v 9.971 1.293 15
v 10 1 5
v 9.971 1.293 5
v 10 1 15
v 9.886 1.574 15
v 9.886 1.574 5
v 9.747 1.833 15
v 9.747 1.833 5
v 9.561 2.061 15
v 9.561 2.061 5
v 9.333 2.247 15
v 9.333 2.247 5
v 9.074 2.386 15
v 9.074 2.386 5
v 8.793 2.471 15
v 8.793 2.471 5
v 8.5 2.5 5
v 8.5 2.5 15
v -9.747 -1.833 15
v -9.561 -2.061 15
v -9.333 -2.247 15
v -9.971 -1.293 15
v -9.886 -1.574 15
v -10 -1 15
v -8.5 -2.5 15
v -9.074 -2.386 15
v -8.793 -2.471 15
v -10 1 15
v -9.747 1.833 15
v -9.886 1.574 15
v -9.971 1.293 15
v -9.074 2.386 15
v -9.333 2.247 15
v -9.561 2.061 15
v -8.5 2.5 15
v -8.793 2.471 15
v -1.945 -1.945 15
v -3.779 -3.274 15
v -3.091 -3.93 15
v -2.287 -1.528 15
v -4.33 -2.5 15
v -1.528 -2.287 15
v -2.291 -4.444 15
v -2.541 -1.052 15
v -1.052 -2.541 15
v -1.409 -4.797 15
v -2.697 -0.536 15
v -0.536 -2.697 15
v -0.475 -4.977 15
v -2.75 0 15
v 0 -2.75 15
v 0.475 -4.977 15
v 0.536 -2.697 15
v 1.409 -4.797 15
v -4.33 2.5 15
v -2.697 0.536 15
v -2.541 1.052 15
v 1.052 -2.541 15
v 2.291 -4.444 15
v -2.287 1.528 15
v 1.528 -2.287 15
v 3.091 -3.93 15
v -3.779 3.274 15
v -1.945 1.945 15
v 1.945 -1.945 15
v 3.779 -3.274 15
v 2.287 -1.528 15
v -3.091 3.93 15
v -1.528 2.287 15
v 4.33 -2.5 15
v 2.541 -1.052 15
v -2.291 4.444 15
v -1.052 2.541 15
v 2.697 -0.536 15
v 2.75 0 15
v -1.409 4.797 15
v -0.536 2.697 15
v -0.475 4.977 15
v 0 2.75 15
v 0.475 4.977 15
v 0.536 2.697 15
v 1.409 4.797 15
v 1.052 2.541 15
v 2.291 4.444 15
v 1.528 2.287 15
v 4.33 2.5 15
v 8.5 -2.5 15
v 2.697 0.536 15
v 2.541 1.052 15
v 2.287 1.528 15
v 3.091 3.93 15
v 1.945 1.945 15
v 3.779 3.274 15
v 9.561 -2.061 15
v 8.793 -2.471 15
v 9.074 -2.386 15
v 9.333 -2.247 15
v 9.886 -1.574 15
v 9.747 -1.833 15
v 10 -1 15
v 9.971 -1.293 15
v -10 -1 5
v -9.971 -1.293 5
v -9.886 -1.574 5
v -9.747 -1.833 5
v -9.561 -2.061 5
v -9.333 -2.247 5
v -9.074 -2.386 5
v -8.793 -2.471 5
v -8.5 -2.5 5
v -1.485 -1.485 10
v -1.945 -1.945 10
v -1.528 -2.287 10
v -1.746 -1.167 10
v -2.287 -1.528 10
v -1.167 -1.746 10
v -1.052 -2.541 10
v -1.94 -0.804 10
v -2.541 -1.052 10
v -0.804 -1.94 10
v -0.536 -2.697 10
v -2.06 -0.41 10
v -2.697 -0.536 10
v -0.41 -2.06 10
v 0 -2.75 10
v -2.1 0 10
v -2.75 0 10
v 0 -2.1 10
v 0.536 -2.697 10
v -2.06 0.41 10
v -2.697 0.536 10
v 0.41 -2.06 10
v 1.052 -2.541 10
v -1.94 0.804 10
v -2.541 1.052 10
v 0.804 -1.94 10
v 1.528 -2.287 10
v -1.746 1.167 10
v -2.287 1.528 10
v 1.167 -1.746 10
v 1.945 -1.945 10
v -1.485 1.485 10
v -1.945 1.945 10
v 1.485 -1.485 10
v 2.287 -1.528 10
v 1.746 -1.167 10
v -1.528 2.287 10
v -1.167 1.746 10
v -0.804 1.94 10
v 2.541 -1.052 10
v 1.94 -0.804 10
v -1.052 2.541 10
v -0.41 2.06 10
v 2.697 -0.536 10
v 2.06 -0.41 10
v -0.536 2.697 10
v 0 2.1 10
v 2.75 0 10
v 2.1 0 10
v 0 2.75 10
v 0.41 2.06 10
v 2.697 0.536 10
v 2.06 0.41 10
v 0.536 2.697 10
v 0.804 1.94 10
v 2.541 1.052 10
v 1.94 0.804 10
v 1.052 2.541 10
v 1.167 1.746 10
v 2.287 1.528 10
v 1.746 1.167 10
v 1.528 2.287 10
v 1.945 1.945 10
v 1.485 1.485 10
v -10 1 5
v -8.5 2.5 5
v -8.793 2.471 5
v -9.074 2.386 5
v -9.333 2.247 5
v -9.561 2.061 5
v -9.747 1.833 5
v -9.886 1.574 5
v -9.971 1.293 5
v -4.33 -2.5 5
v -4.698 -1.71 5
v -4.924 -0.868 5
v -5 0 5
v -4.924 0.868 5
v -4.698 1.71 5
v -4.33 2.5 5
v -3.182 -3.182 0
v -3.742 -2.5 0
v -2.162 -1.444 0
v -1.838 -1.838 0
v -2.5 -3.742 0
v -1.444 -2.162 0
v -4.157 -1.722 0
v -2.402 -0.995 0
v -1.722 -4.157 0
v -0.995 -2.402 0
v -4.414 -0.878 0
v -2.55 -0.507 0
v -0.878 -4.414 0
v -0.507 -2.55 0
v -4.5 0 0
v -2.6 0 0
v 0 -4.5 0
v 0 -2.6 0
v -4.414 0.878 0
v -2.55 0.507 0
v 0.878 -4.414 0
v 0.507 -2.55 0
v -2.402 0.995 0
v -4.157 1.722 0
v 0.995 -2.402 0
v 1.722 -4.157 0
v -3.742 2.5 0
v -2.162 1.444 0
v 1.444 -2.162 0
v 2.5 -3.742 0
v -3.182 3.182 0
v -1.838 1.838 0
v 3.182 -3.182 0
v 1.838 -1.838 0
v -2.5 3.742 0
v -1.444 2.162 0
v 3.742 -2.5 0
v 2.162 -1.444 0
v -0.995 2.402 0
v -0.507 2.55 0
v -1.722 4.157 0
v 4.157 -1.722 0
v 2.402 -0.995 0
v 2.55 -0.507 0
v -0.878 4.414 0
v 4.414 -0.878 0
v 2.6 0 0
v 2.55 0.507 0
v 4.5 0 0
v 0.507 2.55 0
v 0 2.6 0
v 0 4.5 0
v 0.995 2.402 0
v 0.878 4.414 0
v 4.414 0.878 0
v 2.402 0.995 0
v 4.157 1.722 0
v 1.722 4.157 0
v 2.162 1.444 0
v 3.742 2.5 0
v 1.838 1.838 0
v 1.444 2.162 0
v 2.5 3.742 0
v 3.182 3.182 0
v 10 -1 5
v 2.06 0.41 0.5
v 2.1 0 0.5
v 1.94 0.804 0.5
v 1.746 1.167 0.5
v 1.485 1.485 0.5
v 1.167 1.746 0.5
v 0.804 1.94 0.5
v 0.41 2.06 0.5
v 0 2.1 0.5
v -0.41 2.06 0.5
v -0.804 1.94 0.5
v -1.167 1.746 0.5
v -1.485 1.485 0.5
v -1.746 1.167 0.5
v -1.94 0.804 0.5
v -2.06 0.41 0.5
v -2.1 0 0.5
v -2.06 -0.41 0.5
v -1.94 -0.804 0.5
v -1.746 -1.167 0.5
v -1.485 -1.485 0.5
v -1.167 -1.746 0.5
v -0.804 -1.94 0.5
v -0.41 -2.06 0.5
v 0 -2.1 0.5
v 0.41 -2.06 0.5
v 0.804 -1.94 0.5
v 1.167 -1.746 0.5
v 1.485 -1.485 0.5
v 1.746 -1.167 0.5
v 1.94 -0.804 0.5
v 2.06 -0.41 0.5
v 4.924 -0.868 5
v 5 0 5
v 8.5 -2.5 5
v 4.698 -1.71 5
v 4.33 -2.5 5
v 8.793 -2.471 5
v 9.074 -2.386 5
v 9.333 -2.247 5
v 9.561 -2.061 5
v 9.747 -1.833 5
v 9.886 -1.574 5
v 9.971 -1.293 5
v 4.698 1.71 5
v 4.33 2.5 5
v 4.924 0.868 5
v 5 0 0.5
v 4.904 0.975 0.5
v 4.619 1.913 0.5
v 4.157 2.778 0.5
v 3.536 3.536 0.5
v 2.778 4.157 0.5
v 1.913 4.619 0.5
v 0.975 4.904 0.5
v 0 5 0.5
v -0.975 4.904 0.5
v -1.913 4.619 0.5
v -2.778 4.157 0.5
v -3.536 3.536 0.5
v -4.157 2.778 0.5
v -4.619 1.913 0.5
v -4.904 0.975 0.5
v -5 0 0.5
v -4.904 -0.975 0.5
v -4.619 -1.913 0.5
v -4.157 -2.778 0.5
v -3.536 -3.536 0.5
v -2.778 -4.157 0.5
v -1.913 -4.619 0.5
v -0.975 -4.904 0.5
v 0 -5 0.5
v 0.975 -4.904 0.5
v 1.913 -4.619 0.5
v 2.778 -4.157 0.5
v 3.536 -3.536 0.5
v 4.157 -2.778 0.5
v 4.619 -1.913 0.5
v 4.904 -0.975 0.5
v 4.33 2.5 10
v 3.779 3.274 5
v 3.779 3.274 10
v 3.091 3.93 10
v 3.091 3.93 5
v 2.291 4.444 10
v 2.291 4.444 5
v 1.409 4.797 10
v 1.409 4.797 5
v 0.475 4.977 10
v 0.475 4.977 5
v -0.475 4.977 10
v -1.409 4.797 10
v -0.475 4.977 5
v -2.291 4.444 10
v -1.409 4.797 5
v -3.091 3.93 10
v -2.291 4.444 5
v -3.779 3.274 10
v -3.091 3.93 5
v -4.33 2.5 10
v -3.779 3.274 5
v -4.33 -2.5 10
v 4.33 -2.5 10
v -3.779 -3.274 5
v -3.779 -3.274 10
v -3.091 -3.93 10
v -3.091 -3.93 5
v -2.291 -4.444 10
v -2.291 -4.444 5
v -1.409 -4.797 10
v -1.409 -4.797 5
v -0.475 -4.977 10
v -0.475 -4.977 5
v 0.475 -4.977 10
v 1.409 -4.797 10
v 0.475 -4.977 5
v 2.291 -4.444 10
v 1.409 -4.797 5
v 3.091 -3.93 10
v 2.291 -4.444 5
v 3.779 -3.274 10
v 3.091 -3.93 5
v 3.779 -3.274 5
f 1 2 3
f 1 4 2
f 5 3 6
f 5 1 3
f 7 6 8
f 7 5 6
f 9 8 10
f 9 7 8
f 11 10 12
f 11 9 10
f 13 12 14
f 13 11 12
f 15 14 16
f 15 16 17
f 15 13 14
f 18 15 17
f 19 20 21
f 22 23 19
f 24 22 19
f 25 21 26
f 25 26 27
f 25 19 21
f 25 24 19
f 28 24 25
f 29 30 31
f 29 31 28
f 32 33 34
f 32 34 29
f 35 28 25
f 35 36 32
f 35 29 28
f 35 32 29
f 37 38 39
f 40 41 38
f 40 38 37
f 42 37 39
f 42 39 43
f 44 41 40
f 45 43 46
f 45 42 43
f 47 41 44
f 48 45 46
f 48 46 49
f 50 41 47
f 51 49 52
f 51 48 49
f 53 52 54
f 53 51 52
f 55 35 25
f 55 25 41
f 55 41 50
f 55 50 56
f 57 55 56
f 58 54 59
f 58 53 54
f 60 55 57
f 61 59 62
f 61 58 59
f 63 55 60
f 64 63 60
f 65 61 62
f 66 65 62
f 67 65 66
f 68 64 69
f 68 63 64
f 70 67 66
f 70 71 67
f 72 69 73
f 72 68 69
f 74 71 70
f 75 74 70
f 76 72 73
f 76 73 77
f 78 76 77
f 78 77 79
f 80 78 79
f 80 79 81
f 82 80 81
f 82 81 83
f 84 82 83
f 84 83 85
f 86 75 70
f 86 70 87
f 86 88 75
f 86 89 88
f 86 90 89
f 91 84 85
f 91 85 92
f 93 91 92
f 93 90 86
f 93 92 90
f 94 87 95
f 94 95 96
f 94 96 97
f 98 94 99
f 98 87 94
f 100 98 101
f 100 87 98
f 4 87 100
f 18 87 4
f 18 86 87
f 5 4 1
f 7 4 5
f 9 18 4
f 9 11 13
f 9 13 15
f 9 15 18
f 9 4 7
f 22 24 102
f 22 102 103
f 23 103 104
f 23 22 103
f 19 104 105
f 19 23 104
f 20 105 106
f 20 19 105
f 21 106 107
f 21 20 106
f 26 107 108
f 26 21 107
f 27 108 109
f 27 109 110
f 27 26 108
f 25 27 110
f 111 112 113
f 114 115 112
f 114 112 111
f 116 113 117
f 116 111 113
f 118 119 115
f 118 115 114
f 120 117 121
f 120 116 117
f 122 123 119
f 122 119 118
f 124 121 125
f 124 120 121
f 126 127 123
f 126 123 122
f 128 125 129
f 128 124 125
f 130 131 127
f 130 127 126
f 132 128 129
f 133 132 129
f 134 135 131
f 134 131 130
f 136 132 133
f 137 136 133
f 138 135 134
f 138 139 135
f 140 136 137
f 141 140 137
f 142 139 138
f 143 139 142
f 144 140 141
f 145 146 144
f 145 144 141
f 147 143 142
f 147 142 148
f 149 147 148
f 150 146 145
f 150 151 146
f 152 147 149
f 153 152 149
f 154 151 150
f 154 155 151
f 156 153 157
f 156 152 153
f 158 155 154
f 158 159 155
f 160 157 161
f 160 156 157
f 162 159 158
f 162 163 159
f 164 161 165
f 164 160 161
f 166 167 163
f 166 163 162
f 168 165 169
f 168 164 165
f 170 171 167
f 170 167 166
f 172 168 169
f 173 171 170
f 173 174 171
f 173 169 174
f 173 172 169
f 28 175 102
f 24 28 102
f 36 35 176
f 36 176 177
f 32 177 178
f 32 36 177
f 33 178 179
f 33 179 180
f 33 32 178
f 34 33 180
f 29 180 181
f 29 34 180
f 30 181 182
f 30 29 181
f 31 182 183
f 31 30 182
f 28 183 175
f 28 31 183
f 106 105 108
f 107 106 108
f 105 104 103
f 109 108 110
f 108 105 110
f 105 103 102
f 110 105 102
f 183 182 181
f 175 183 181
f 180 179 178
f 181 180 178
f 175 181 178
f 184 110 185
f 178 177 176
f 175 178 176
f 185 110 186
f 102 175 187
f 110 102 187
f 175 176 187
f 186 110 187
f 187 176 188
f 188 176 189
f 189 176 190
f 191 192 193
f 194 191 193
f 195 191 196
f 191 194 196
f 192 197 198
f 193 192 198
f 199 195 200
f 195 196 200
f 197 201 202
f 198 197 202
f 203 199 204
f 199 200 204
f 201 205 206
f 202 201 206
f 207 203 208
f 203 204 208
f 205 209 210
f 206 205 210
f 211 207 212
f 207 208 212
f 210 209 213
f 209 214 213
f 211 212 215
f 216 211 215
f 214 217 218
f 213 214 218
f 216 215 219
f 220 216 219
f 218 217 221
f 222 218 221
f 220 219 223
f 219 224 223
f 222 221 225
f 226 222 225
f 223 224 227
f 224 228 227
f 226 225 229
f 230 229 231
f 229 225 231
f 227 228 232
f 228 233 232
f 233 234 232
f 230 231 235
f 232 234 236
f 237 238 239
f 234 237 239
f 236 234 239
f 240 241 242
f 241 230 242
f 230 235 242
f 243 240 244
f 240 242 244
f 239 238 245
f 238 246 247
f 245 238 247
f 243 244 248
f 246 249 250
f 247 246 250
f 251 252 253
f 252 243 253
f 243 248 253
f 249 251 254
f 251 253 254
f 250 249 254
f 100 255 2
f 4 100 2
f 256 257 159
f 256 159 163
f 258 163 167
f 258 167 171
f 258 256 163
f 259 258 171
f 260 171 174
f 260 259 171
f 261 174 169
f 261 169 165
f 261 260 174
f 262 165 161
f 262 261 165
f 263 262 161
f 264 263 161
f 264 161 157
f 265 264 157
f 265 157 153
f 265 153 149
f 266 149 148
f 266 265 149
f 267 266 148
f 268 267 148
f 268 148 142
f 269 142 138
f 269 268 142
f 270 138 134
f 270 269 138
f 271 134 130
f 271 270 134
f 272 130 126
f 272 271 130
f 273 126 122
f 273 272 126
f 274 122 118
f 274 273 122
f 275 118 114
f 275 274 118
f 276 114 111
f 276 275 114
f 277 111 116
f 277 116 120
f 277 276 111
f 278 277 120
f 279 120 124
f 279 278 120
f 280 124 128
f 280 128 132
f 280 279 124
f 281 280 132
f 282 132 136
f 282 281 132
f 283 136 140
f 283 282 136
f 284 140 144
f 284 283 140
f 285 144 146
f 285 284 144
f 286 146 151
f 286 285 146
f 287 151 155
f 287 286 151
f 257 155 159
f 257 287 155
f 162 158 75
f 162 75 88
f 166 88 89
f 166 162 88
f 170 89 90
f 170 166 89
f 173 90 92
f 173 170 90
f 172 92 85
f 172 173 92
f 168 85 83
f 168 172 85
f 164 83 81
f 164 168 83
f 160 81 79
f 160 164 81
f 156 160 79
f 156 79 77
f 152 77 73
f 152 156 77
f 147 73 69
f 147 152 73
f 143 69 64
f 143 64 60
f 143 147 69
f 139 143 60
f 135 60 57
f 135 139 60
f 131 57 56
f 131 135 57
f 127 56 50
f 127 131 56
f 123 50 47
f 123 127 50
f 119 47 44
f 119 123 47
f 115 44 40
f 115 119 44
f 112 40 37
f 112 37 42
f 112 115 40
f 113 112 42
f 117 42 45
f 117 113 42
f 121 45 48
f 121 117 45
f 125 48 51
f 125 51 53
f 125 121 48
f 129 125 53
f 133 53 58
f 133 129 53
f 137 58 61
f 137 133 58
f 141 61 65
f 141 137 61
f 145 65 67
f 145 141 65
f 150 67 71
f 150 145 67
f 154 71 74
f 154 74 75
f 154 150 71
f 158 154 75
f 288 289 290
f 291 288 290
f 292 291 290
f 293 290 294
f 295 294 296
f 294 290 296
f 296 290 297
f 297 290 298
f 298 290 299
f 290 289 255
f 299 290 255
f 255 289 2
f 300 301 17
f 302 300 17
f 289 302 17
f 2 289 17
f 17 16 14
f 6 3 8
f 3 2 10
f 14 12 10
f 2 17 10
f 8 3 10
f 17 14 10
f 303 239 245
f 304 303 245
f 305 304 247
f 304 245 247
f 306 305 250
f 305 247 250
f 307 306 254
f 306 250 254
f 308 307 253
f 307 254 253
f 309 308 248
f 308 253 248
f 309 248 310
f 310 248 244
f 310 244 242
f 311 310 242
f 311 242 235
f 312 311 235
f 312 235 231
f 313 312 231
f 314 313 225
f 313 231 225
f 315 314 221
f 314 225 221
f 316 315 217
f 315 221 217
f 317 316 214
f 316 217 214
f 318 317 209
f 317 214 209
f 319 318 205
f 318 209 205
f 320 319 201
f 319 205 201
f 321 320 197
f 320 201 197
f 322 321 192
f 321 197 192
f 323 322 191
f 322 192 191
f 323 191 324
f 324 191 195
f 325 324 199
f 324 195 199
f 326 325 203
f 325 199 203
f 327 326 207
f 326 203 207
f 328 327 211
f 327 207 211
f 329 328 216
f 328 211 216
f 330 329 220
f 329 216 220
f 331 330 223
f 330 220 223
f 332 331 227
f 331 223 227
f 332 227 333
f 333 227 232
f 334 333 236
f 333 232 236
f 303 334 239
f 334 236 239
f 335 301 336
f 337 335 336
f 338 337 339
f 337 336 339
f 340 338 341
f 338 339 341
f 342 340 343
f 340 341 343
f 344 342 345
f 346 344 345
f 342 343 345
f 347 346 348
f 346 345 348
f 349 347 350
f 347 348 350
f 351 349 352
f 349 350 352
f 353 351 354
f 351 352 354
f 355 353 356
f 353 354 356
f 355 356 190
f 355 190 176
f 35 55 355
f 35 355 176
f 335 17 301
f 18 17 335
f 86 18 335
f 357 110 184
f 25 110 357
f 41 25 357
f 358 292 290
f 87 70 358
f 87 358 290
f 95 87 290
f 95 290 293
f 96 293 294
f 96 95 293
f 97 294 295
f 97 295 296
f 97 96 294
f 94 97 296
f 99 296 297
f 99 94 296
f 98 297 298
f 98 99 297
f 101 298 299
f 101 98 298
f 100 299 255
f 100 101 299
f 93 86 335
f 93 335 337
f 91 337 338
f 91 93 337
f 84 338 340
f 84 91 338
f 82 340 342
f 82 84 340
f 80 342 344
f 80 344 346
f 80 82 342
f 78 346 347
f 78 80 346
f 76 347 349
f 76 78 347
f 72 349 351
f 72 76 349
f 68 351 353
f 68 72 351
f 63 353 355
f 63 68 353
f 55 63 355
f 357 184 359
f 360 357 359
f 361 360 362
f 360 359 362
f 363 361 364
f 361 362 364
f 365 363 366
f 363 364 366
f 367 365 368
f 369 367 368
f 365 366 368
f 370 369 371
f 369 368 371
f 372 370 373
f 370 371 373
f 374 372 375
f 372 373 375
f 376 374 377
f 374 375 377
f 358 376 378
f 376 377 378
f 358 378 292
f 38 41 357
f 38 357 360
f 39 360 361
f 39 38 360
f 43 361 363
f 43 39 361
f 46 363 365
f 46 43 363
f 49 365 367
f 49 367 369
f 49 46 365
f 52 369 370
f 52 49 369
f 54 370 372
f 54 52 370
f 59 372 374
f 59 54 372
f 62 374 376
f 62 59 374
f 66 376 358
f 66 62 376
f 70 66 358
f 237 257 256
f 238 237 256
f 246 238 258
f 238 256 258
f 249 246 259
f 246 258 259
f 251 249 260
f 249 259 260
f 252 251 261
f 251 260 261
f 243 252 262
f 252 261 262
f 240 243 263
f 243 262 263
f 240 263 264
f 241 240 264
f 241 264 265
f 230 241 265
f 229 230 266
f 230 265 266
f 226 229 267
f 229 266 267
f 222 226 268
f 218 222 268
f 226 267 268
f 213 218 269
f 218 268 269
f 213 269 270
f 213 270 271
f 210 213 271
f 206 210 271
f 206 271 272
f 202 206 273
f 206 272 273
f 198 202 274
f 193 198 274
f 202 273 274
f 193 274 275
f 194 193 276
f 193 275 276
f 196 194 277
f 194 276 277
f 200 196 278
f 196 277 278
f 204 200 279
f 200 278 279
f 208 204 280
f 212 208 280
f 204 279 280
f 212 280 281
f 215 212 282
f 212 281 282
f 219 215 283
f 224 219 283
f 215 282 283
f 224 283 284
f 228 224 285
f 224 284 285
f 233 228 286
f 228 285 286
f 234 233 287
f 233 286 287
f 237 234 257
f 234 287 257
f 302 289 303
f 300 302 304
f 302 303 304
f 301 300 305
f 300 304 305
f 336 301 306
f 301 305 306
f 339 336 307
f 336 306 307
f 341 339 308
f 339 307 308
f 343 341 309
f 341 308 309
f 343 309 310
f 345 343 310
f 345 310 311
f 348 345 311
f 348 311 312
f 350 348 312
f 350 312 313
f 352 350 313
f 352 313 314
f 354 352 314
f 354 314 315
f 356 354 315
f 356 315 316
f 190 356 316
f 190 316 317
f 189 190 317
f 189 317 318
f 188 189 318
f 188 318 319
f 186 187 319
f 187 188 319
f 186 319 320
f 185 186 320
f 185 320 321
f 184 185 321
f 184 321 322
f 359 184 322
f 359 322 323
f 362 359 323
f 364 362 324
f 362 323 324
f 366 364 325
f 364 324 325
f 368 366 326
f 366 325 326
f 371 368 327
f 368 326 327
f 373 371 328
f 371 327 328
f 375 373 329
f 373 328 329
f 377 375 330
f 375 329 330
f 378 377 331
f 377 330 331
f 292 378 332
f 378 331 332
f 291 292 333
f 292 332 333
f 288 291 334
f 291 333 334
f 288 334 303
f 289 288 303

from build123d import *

# Parameters (mm, degrees)
F0_R     = 5
F0_R_2   = 2.1
F1_DEPTH = 10
F2_R     = 2.75
F3_DEPTH = 5
F4_SIZE  = 0.5


with BuildPart() as f1:
    # F0 (on Top) → F1 (new body)
    with BuildSketch(Plane.XY):
        Circle(F0_R)
        Circle(F0_R_2, mode=Mode.SUBTRACT)
    extrude(amount=F1_DEPTH)

    # F2 (on face) → F3 (join, symmetric)
    with BuildSketch(Plane.XY.offset(10)):
        with BuildLine():
            ThreePointArc((5, 0), (4.829629, 1.294095), (4.330127, 2.5))
            ThreePointArc((4.330127, 2.5), (0, 5), (-4.330127, 2.5))
            ThreePointArc((-4.330127, 2.5), (-5, 0), (-4.330127, -2.5))
            ThreePointArc((-4.330127, -2.5), (0, -5), (4.330127, -2.5))
            ThreePointArc((4.330127, -2.5), (4.829629, -1.294095), (5, 0))
        make_face()
        Circle(F2_R, mode=Mode.SUBTRACT)
        with BuildLine():
            Line((8.5, 2.5), (4.330127, 2.5))
            ThreePointArc((4.330127, 2.5), (4.829629, 1.294095), (5, 0))
            ThreePointArc((5, 0), (4.829629, -1.294095), (4.330127, -2.5))
            Line((4.330127, -2.5), (8.5, -2.5))
            ThreePointArc((8.5, -2.5), (9.56066, -2.06066), (10, -1))
            Line((10, -1), (10, 1))
            ThreePointArc((10, 1), (9.56066, 2.06066), (8.5, 2.5))
        make_face()
        with BuildLine():
            ThreePointArc((-4.330127, -2.5), (-5, 0), (-4.330127, 2.5))
            Line((-4.330127, 2.5), (-8.5, 2.5))
            ThreePointArc((-8.5, 2.5), (-9.56066, 2.06066), (-10, 1))
            Line((-10, 1), (-10, -1))
            ThreePointArc((-10, -1), (-9.56066, -2.06066), (-8.5, -2.5))
            Line((-8.5, -2.5), (-4.330127, -2.5))
        make_face()
    extrude(amount=F3_DEPTH, both=True)

    # F4
    f4_edges = [f1.edges().sort_by_distance(p)[0] for p in [
        (-5, 0, 0),
        (-2.1, 0, 0),
    ]]
    chamfer(f4_edges, length=F4_SIZE)


solid = f1.part
